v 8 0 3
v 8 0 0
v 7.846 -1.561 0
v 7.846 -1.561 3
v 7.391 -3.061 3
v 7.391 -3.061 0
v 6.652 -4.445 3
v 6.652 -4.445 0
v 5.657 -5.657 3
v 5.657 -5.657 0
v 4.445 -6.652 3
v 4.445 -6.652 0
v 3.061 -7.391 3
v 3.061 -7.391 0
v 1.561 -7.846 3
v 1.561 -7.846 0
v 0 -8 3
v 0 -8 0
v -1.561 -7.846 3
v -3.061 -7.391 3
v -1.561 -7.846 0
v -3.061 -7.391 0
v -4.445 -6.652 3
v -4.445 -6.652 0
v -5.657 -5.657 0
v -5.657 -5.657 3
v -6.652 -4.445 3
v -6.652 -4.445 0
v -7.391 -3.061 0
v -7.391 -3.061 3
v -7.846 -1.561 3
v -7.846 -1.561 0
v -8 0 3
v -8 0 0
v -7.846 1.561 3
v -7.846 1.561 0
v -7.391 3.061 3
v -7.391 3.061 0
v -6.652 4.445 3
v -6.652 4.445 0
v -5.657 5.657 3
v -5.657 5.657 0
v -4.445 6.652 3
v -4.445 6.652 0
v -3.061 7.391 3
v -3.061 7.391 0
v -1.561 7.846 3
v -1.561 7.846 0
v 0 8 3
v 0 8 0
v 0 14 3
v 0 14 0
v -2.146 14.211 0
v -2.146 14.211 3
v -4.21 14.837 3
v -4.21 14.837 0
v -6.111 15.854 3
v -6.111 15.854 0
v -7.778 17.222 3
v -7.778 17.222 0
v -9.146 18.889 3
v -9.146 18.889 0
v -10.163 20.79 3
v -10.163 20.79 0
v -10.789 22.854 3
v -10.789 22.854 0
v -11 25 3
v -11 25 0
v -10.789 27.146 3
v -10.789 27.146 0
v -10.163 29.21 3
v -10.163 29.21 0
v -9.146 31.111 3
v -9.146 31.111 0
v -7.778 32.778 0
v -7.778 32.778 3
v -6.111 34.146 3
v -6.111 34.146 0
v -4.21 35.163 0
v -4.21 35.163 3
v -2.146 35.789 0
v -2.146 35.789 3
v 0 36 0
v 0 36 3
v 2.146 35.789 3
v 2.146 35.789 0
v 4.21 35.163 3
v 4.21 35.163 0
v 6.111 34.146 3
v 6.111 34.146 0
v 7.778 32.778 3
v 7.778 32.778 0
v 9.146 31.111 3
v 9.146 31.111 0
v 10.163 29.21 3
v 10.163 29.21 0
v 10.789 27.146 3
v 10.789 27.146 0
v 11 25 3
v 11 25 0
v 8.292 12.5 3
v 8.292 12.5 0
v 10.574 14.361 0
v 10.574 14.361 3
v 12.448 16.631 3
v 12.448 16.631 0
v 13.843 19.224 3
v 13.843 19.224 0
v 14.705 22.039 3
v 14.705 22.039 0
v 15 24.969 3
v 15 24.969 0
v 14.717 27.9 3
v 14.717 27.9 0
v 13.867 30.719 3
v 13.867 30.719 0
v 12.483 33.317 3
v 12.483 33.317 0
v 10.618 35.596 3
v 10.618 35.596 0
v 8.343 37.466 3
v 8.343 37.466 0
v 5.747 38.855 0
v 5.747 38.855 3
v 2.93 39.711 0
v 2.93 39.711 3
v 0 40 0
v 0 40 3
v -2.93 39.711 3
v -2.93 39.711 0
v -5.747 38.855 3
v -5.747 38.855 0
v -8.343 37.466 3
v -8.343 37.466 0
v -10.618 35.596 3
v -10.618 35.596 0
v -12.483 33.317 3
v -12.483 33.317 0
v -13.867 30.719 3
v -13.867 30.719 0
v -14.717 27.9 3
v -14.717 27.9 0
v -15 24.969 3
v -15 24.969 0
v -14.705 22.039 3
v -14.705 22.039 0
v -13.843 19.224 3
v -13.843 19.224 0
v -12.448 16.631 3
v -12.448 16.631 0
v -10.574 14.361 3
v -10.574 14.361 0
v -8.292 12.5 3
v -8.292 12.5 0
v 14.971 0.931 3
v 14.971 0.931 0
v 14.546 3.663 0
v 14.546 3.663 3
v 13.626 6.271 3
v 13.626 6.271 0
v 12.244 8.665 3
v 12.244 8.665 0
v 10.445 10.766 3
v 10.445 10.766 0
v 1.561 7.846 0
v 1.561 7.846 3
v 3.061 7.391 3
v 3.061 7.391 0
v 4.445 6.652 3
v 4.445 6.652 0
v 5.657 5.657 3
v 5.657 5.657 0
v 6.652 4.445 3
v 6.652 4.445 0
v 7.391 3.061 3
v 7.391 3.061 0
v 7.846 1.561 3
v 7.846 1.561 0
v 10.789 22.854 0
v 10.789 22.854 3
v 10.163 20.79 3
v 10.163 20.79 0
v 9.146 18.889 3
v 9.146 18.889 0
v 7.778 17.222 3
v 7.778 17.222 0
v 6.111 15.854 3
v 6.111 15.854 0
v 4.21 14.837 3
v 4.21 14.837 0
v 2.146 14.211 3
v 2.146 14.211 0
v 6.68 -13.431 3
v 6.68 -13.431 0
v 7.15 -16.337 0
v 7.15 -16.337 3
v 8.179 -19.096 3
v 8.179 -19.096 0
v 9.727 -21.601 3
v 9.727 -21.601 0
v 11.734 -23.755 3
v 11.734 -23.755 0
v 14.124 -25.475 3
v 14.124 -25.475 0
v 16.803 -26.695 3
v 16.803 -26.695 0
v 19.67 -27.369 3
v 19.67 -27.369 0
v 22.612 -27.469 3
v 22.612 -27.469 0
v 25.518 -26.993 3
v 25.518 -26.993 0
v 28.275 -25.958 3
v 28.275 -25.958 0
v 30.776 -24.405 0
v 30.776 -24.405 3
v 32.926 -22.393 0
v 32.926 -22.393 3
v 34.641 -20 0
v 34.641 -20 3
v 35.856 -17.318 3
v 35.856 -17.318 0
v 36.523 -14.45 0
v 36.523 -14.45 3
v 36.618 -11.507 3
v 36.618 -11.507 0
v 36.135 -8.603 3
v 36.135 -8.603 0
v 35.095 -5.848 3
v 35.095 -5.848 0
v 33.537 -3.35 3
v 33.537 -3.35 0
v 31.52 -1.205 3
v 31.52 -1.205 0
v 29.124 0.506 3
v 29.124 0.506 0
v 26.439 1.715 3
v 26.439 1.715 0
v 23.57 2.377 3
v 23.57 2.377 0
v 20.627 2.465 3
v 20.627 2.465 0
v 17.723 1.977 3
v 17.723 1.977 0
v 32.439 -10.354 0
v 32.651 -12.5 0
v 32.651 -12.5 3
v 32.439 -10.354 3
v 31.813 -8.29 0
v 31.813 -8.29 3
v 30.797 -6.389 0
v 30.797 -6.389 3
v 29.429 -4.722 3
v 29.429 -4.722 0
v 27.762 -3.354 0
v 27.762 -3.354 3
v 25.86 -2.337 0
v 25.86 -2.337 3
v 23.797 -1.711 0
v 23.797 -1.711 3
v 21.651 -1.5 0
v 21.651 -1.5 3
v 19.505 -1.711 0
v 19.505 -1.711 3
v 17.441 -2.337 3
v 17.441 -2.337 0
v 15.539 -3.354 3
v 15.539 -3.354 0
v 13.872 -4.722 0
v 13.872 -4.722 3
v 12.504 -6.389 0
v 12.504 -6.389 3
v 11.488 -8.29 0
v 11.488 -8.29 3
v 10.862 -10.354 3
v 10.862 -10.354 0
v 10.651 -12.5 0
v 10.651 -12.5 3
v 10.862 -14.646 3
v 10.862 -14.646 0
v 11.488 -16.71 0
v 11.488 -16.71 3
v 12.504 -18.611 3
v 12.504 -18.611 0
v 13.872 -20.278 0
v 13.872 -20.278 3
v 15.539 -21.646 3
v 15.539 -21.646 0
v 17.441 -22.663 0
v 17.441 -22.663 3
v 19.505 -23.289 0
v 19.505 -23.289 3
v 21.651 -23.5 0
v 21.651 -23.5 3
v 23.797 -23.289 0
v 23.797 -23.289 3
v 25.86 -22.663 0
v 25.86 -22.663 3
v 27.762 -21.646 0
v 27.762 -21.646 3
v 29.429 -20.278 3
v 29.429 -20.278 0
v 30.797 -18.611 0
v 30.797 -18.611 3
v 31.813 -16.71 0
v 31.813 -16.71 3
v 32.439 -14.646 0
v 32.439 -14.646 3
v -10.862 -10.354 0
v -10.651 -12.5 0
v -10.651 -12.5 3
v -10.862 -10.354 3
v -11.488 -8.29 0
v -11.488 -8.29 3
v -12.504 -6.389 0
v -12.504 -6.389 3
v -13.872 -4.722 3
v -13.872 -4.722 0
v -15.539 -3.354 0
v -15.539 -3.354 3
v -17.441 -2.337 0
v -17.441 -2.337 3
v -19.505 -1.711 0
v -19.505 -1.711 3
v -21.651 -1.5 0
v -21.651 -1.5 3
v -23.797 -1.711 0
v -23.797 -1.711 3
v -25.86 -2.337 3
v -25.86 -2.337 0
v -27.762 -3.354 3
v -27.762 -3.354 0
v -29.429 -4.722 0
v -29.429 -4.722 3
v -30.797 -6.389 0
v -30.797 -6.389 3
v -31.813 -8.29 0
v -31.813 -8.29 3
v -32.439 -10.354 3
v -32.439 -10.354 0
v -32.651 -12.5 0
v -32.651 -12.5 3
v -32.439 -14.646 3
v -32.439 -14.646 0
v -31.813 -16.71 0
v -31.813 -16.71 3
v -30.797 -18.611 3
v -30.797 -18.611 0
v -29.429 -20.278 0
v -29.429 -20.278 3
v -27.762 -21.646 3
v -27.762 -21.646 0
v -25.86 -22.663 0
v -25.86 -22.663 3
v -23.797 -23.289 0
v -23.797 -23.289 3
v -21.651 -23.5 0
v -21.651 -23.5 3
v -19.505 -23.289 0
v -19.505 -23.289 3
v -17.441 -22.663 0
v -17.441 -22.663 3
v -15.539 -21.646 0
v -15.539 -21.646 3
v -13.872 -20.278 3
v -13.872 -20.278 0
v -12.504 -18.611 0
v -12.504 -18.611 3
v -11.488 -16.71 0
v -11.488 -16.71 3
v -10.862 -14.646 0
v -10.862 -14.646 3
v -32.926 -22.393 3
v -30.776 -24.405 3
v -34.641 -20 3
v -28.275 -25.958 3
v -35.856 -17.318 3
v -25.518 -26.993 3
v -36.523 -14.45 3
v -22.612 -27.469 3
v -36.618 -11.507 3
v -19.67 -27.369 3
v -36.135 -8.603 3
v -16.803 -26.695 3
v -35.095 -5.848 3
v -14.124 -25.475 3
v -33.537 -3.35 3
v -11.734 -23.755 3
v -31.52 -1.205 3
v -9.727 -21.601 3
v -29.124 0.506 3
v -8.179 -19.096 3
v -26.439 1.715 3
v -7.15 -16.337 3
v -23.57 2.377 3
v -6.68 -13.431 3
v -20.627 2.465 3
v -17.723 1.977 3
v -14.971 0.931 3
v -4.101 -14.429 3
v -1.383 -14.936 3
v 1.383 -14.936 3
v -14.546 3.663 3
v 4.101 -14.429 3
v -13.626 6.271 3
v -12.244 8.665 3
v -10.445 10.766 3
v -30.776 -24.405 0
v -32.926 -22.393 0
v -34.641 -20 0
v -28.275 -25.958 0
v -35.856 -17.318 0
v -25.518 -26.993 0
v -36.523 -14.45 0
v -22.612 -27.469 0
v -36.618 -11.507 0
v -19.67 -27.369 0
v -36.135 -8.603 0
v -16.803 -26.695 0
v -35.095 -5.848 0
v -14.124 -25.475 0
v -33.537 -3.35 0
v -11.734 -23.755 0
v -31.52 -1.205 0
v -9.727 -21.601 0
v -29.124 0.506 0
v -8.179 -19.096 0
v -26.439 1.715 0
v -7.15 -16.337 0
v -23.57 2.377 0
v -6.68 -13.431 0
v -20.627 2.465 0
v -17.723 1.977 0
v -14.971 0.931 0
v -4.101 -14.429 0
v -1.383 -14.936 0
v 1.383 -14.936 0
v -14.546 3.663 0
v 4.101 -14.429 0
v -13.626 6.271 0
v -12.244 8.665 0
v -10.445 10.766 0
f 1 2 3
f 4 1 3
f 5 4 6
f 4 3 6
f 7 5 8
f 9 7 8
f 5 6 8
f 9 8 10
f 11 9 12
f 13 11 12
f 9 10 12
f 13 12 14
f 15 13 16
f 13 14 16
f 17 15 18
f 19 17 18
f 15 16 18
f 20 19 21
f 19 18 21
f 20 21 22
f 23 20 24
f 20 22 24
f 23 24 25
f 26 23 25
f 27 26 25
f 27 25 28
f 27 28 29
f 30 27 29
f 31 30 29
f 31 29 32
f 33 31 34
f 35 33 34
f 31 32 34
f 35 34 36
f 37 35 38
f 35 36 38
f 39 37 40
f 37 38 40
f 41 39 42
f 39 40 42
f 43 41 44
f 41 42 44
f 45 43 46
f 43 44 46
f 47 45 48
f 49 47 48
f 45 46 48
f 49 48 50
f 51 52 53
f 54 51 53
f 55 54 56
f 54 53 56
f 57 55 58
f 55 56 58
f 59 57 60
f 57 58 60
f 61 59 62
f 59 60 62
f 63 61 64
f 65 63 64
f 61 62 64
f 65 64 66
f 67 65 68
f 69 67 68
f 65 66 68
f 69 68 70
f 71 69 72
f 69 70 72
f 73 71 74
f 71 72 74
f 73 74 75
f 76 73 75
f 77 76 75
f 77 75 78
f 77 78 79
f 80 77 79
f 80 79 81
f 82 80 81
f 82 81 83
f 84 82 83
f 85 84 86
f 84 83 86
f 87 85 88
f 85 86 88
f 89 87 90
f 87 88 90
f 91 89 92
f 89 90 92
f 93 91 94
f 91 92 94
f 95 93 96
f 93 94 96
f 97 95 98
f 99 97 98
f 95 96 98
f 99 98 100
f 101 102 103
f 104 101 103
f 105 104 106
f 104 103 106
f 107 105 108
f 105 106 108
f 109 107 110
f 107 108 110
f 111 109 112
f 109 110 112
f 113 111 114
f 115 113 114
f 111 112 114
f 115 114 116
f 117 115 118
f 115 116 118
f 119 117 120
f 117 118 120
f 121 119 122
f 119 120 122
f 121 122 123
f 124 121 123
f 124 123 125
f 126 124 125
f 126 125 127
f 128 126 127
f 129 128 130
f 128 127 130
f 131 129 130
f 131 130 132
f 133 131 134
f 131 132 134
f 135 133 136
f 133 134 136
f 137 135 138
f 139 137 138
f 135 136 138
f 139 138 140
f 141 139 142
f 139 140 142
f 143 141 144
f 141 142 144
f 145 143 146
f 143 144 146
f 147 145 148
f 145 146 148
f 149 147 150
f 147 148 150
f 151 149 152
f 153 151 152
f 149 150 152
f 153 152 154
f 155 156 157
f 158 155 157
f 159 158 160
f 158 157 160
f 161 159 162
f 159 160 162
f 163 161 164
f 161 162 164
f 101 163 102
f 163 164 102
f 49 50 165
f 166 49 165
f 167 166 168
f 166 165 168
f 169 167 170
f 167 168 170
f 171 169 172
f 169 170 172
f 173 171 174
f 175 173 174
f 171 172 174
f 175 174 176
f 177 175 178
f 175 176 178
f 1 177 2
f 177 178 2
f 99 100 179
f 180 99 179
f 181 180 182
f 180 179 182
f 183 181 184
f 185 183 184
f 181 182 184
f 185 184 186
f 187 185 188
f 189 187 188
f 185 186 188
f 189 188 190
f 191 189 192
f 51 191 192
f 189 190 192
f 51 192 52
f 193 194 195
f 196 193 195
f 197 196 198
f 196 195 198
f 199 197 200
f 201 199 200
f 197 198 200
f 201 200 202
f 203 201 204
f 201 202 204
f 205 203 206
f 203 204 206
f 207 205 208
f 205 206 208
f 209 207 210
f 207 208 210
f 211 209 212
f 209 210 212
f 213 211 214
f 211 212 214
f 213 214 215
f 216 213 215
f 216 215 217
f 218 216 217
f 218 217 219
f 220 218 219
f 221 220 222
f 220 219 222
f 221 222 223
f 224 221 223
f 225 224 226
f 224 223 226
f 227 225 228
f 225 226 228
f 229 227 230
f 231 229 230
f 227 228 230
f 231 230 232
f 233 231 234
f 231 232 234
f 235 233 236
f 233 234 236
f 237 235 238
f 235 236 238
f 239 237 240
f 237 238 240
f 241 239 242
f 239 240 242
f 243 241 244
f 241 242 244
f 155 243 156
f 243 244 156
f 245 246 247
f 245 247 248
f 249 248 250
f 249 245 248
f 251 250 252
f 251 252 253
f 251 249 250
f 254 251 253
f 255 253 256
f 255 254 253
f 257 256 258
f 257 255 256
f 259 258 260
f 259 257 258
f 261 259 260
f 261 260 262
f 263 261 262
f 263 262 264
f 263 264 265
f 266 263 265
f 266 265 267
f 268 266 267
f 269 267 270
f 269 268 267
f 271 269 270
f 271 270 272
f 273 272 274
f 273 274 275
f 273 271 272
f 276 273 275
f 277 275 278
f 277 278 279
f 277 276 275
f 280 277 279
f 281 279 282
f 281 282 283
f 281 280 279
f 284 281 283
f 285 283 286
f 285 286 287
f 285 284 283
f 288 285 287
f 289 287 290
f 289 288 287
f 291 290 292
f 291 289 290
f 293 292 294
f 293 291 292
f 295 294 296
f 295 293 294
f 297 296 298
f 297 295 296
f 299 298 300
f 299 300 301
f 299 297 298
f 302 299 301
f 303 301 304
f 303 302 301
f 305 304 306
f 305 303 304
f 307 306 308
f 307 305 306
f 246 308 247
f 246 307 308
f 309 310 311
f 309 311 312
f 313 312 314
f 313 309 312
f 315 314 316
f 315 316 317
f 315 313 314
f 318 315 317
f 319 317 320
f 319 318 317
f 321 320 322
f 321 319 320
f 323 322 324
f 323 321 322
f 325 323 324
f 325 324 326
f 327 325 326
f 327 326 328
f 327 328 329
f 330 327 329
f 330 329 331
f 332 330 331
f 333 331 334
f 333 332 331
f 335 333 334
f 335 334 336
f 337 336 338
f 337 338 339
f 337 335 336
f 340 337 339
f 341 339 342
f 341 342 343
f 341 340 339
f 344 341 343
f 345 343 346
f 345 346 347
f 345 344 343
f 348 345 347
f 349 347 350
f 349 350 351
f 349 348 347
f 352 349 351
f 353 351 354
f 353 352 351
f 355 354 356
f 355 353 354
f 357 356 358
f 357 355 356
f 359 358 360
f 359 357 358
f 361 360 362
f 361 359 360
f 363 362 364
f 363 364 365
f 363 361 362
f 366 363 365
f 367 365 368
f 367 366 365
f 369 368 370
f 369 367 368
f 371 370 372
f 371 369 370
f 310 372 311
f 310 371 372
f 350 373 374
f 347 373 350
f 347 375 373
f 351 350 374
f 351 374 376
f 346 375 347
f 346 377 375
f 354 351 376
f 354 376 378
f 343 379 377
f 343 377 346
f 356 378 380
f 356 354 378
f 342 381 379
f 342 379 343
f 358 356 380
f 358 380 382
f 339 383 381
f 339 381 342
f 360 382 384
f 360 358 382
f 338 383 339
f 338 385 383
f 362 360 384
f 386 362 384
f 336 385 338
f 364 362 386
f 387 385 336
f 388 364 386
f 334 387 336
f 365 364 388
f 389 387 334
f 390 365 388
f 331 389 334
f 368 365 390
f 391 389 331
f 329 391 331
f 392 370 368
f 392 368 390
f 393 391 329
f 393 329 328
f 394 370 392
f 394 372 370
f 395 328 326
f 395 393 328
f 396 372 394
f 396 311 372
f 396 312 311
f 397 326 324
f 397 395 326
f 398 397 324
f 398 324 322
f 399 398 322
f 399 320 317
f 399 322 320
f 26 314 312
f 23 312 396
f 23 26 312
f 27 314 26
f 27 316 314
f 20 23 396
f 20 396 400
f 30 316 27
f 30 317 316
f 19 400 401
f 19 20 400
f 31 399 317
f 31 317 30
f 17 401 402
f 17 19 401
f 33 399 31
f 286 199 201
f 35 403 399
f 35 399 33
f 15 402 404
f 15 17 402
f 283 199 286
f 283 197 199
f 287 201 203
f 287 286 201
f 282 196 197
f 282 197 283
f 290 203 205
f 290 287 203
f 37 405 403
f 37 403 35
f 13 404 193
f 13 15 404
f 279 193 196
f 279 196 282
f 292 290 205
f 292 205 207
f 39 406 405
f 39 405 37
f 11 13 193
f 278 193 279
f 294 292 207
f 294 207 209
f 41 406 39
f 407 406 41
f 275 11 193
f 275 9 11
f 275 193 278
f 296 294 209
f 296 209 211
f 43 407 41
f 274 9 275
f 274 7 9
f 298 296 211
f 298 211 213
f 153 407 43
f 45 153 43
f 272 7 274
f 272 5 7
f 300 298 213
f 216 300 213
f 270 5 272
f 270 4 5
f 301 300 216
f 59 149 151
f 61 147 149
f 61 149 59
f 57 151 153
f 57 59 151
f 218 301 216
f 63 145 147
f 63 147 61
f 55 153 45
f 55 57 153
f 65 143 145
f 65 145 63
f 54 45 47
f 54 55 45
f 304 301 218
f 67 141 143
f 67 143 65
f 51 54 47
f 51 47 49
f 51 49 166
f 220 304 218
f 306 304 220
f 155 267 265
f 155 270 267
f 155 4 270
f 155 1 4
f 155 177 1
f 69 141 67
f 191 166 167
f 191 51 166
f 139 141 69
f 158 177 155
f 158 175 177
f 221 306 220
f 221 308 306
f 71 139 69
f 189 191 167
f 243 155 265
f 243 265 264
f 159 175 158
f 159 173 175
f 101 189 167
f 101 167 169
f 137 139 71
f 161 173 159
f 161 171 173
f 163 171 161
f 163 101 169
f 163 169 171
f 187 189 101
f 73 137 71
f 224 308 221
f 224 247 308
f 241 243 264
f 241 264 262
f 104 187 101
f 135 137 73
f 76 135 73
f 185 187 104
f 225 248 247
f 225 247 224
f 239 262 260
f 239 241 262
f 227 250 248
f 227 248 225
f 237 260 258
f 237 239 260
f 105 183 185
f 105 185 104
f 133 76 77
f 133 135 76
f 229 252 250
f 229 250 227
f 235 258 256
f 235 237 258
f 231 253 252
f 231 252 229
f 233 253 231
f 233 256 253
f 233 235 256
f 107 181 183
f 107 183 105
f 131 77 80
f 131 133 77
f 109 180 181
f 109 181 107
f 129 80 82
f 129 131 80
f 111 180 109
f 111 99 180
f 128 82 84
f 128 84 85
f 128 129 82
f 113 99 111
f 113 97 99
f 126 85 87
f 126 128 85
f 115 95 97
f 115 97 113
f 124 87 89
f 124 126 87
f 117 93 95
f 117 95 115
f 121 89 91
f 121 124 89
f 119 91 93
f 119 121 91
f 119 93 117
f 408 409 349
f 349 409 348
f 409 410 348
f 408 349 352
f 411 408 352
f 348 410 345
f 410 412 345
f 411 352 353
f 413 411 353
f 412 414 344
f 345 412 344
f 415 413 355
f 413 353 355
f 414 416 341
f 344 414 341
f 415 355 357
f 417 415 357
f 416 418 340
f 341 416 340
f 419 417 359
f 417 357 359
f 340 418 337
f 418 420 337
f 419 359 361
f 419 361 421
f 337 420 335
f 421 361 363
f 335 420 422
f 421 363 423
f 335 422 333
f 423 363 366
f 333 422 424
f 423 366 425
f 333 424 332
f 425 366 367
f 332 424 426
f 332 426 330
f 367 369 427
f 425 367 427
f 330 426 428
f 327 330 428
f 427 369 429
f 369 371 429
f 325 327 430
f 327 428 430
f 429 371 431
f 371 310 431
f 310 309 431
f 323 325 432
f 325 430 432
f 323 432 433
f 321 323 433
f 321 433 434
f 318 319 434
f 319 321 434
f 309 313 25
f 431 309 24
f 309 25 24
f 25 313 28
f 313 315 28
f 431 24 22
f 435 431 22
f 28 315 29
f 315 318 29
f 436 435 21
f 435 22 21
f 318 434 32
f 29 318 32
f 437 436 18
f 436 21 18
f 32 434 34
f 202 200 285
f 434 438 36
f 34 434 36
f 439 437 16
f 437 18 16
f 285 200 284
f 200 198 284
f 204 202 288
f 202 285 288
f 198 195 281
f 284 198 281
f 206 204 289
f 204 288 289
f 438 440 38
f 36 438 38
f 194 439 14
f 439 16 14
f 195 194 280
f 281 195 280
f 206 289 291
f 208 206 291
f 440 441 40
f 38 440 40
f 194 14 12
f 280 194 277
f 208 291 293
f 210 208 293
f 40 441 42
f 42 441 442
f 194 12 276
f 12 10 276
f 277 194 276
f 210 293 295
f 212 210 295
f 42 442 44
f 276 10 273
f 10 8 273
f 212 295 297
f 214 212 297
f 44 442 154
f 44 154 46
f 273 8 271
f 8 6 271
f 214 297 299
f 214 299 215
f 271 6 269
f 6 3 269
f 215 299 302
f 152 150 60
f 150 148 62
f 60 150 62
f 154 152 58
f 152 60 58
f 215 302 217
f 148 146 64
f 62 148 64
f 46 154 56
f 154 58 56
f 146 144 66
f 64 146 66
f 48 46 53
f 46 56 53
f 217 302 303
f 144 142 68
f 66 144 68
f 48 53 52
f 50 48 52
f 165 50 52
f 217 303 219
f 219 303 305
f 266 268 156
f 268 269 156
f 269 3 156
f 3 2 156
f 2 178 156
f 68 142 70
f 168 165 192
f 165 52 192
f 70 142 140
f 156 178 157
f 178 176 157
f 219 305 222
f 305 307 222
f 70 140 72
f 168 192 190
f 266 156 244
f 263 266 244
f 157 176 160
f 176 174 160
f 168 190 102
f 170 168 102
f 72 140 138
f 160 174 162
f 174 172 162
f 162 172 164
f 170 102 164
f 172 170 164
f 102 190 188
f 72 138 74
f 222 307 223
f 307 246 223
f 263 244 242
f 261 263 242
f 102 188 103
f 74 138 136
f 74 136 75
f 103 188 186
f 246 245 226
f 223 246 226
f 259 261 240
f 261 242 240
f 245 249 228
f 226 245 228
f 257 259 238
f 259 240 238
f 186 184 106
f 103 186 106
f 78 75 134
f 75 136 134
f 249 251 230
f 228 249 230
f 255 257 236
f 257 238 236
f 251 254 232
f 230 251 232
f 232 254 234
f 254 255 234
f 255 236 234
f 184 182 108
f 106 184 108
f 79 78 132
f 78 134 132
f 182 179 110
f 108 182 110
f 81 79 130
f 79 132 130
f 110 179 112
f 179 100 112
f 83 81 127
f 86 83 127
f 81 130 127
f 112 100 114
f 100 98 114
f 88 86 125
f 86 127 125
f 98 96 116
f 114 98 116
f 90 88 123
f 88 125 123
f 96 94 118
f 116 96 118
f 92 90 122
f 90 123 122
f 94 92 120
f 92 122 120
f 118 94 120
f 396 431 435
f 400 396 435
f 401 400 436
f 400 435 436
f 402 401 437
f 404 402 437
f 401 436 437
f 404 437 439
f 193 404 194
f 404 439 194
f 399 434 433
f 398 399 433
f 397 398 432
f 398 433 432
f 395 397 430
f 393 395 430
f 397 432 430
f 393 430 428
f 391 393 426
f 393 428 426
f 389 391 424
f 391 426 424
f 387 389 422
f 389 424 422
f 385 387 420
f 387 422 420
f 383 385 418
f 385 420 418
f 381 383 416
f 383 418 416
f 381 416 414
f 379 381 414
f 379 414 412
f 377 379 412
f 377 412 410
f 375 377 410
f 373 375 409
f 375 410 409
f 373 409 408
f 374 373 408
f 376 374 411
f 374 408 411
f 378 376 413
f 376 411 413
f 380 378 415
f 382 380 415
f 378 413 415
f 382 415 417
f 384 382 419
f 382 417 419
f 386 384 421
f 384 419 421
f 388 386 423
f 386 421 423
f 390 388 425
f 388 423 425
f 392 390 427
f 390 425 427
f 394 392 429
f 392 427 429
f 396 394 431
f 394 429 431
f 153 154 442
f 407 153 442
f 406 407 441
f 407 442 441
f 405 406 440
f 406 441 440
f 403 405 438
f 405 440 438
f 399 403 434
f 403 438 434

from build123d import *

# Parameters (mm, degrees)
F0_R     = 11
F1_DEPTH = 3


with BuildPart() as f1:
    # F0 (on Top) → F1 (new body)
    with BuildSketch(Plane.XY):
        with BuildLine():
            ThreePointArc((0, 8), (-5.656854, -5.656854), (8, 0))
            ThreePointArc((8, 0), (5.656854, 5.656854), (0, 8))
        make_face()
        with BuildLine():
            ThreePointArc((11, 25), (-7.778175, 32.778175), (0, 14))
            ThreePointArc((0, 14), (7.778175, 17.221825), (11, 25))
        make_face()
        with BuildLine():
            ThreePointArc((8.291562, 12.5), (0, 40), (-8.291562, 12.5))
            ThreePointArc((-8.291562, 12.5), (-12.990381, 7.5), (-14.971099, 0.930703))
            ThreePointArc((-14.971099, 0.930703), (-34.641016, -20), (-6.679537, -13.430703))
            ThreePointArc((-6.679537, -13.430703), (0, -15), (6.679537, -13.430703))
            ThreePointArc((6.679537, -13.430703), (34.641016, -20), (14.971099, 0.930703))
            ThreePointArc((14.971099, 0.930703), (12.990381, 7.5), (8.291562, 12.5))
        make_face()
        with Locations((-21.650635, -12.5)):
            Circle(F0_R, mode=Mode.SUBTRACT)
        with Locations((21.650635, -12.5)):
            Circle(F0_R, mode=Mode.SUBTRACT)
        with BuildLine():
            ThreePointArc((0, 8), (5.656854, 5.656854), (8, 0))
            ThreePointArc((8, 0), (-5.656854, -5.656854), (0, 8))
        make_face(mode=Mode.SUBTRACT)
        with BuildLine():
            ThreePointArc((11, 25), (7.778175, 17.221825), (0, 14))
            ThreePointArc((0, 14), (-7.778175, 32.778175), (11, 25))
        make_face(mode=Mode.SUBTRACT)
    extrude(amount=F1_DEPTH)


solid = f1.part
